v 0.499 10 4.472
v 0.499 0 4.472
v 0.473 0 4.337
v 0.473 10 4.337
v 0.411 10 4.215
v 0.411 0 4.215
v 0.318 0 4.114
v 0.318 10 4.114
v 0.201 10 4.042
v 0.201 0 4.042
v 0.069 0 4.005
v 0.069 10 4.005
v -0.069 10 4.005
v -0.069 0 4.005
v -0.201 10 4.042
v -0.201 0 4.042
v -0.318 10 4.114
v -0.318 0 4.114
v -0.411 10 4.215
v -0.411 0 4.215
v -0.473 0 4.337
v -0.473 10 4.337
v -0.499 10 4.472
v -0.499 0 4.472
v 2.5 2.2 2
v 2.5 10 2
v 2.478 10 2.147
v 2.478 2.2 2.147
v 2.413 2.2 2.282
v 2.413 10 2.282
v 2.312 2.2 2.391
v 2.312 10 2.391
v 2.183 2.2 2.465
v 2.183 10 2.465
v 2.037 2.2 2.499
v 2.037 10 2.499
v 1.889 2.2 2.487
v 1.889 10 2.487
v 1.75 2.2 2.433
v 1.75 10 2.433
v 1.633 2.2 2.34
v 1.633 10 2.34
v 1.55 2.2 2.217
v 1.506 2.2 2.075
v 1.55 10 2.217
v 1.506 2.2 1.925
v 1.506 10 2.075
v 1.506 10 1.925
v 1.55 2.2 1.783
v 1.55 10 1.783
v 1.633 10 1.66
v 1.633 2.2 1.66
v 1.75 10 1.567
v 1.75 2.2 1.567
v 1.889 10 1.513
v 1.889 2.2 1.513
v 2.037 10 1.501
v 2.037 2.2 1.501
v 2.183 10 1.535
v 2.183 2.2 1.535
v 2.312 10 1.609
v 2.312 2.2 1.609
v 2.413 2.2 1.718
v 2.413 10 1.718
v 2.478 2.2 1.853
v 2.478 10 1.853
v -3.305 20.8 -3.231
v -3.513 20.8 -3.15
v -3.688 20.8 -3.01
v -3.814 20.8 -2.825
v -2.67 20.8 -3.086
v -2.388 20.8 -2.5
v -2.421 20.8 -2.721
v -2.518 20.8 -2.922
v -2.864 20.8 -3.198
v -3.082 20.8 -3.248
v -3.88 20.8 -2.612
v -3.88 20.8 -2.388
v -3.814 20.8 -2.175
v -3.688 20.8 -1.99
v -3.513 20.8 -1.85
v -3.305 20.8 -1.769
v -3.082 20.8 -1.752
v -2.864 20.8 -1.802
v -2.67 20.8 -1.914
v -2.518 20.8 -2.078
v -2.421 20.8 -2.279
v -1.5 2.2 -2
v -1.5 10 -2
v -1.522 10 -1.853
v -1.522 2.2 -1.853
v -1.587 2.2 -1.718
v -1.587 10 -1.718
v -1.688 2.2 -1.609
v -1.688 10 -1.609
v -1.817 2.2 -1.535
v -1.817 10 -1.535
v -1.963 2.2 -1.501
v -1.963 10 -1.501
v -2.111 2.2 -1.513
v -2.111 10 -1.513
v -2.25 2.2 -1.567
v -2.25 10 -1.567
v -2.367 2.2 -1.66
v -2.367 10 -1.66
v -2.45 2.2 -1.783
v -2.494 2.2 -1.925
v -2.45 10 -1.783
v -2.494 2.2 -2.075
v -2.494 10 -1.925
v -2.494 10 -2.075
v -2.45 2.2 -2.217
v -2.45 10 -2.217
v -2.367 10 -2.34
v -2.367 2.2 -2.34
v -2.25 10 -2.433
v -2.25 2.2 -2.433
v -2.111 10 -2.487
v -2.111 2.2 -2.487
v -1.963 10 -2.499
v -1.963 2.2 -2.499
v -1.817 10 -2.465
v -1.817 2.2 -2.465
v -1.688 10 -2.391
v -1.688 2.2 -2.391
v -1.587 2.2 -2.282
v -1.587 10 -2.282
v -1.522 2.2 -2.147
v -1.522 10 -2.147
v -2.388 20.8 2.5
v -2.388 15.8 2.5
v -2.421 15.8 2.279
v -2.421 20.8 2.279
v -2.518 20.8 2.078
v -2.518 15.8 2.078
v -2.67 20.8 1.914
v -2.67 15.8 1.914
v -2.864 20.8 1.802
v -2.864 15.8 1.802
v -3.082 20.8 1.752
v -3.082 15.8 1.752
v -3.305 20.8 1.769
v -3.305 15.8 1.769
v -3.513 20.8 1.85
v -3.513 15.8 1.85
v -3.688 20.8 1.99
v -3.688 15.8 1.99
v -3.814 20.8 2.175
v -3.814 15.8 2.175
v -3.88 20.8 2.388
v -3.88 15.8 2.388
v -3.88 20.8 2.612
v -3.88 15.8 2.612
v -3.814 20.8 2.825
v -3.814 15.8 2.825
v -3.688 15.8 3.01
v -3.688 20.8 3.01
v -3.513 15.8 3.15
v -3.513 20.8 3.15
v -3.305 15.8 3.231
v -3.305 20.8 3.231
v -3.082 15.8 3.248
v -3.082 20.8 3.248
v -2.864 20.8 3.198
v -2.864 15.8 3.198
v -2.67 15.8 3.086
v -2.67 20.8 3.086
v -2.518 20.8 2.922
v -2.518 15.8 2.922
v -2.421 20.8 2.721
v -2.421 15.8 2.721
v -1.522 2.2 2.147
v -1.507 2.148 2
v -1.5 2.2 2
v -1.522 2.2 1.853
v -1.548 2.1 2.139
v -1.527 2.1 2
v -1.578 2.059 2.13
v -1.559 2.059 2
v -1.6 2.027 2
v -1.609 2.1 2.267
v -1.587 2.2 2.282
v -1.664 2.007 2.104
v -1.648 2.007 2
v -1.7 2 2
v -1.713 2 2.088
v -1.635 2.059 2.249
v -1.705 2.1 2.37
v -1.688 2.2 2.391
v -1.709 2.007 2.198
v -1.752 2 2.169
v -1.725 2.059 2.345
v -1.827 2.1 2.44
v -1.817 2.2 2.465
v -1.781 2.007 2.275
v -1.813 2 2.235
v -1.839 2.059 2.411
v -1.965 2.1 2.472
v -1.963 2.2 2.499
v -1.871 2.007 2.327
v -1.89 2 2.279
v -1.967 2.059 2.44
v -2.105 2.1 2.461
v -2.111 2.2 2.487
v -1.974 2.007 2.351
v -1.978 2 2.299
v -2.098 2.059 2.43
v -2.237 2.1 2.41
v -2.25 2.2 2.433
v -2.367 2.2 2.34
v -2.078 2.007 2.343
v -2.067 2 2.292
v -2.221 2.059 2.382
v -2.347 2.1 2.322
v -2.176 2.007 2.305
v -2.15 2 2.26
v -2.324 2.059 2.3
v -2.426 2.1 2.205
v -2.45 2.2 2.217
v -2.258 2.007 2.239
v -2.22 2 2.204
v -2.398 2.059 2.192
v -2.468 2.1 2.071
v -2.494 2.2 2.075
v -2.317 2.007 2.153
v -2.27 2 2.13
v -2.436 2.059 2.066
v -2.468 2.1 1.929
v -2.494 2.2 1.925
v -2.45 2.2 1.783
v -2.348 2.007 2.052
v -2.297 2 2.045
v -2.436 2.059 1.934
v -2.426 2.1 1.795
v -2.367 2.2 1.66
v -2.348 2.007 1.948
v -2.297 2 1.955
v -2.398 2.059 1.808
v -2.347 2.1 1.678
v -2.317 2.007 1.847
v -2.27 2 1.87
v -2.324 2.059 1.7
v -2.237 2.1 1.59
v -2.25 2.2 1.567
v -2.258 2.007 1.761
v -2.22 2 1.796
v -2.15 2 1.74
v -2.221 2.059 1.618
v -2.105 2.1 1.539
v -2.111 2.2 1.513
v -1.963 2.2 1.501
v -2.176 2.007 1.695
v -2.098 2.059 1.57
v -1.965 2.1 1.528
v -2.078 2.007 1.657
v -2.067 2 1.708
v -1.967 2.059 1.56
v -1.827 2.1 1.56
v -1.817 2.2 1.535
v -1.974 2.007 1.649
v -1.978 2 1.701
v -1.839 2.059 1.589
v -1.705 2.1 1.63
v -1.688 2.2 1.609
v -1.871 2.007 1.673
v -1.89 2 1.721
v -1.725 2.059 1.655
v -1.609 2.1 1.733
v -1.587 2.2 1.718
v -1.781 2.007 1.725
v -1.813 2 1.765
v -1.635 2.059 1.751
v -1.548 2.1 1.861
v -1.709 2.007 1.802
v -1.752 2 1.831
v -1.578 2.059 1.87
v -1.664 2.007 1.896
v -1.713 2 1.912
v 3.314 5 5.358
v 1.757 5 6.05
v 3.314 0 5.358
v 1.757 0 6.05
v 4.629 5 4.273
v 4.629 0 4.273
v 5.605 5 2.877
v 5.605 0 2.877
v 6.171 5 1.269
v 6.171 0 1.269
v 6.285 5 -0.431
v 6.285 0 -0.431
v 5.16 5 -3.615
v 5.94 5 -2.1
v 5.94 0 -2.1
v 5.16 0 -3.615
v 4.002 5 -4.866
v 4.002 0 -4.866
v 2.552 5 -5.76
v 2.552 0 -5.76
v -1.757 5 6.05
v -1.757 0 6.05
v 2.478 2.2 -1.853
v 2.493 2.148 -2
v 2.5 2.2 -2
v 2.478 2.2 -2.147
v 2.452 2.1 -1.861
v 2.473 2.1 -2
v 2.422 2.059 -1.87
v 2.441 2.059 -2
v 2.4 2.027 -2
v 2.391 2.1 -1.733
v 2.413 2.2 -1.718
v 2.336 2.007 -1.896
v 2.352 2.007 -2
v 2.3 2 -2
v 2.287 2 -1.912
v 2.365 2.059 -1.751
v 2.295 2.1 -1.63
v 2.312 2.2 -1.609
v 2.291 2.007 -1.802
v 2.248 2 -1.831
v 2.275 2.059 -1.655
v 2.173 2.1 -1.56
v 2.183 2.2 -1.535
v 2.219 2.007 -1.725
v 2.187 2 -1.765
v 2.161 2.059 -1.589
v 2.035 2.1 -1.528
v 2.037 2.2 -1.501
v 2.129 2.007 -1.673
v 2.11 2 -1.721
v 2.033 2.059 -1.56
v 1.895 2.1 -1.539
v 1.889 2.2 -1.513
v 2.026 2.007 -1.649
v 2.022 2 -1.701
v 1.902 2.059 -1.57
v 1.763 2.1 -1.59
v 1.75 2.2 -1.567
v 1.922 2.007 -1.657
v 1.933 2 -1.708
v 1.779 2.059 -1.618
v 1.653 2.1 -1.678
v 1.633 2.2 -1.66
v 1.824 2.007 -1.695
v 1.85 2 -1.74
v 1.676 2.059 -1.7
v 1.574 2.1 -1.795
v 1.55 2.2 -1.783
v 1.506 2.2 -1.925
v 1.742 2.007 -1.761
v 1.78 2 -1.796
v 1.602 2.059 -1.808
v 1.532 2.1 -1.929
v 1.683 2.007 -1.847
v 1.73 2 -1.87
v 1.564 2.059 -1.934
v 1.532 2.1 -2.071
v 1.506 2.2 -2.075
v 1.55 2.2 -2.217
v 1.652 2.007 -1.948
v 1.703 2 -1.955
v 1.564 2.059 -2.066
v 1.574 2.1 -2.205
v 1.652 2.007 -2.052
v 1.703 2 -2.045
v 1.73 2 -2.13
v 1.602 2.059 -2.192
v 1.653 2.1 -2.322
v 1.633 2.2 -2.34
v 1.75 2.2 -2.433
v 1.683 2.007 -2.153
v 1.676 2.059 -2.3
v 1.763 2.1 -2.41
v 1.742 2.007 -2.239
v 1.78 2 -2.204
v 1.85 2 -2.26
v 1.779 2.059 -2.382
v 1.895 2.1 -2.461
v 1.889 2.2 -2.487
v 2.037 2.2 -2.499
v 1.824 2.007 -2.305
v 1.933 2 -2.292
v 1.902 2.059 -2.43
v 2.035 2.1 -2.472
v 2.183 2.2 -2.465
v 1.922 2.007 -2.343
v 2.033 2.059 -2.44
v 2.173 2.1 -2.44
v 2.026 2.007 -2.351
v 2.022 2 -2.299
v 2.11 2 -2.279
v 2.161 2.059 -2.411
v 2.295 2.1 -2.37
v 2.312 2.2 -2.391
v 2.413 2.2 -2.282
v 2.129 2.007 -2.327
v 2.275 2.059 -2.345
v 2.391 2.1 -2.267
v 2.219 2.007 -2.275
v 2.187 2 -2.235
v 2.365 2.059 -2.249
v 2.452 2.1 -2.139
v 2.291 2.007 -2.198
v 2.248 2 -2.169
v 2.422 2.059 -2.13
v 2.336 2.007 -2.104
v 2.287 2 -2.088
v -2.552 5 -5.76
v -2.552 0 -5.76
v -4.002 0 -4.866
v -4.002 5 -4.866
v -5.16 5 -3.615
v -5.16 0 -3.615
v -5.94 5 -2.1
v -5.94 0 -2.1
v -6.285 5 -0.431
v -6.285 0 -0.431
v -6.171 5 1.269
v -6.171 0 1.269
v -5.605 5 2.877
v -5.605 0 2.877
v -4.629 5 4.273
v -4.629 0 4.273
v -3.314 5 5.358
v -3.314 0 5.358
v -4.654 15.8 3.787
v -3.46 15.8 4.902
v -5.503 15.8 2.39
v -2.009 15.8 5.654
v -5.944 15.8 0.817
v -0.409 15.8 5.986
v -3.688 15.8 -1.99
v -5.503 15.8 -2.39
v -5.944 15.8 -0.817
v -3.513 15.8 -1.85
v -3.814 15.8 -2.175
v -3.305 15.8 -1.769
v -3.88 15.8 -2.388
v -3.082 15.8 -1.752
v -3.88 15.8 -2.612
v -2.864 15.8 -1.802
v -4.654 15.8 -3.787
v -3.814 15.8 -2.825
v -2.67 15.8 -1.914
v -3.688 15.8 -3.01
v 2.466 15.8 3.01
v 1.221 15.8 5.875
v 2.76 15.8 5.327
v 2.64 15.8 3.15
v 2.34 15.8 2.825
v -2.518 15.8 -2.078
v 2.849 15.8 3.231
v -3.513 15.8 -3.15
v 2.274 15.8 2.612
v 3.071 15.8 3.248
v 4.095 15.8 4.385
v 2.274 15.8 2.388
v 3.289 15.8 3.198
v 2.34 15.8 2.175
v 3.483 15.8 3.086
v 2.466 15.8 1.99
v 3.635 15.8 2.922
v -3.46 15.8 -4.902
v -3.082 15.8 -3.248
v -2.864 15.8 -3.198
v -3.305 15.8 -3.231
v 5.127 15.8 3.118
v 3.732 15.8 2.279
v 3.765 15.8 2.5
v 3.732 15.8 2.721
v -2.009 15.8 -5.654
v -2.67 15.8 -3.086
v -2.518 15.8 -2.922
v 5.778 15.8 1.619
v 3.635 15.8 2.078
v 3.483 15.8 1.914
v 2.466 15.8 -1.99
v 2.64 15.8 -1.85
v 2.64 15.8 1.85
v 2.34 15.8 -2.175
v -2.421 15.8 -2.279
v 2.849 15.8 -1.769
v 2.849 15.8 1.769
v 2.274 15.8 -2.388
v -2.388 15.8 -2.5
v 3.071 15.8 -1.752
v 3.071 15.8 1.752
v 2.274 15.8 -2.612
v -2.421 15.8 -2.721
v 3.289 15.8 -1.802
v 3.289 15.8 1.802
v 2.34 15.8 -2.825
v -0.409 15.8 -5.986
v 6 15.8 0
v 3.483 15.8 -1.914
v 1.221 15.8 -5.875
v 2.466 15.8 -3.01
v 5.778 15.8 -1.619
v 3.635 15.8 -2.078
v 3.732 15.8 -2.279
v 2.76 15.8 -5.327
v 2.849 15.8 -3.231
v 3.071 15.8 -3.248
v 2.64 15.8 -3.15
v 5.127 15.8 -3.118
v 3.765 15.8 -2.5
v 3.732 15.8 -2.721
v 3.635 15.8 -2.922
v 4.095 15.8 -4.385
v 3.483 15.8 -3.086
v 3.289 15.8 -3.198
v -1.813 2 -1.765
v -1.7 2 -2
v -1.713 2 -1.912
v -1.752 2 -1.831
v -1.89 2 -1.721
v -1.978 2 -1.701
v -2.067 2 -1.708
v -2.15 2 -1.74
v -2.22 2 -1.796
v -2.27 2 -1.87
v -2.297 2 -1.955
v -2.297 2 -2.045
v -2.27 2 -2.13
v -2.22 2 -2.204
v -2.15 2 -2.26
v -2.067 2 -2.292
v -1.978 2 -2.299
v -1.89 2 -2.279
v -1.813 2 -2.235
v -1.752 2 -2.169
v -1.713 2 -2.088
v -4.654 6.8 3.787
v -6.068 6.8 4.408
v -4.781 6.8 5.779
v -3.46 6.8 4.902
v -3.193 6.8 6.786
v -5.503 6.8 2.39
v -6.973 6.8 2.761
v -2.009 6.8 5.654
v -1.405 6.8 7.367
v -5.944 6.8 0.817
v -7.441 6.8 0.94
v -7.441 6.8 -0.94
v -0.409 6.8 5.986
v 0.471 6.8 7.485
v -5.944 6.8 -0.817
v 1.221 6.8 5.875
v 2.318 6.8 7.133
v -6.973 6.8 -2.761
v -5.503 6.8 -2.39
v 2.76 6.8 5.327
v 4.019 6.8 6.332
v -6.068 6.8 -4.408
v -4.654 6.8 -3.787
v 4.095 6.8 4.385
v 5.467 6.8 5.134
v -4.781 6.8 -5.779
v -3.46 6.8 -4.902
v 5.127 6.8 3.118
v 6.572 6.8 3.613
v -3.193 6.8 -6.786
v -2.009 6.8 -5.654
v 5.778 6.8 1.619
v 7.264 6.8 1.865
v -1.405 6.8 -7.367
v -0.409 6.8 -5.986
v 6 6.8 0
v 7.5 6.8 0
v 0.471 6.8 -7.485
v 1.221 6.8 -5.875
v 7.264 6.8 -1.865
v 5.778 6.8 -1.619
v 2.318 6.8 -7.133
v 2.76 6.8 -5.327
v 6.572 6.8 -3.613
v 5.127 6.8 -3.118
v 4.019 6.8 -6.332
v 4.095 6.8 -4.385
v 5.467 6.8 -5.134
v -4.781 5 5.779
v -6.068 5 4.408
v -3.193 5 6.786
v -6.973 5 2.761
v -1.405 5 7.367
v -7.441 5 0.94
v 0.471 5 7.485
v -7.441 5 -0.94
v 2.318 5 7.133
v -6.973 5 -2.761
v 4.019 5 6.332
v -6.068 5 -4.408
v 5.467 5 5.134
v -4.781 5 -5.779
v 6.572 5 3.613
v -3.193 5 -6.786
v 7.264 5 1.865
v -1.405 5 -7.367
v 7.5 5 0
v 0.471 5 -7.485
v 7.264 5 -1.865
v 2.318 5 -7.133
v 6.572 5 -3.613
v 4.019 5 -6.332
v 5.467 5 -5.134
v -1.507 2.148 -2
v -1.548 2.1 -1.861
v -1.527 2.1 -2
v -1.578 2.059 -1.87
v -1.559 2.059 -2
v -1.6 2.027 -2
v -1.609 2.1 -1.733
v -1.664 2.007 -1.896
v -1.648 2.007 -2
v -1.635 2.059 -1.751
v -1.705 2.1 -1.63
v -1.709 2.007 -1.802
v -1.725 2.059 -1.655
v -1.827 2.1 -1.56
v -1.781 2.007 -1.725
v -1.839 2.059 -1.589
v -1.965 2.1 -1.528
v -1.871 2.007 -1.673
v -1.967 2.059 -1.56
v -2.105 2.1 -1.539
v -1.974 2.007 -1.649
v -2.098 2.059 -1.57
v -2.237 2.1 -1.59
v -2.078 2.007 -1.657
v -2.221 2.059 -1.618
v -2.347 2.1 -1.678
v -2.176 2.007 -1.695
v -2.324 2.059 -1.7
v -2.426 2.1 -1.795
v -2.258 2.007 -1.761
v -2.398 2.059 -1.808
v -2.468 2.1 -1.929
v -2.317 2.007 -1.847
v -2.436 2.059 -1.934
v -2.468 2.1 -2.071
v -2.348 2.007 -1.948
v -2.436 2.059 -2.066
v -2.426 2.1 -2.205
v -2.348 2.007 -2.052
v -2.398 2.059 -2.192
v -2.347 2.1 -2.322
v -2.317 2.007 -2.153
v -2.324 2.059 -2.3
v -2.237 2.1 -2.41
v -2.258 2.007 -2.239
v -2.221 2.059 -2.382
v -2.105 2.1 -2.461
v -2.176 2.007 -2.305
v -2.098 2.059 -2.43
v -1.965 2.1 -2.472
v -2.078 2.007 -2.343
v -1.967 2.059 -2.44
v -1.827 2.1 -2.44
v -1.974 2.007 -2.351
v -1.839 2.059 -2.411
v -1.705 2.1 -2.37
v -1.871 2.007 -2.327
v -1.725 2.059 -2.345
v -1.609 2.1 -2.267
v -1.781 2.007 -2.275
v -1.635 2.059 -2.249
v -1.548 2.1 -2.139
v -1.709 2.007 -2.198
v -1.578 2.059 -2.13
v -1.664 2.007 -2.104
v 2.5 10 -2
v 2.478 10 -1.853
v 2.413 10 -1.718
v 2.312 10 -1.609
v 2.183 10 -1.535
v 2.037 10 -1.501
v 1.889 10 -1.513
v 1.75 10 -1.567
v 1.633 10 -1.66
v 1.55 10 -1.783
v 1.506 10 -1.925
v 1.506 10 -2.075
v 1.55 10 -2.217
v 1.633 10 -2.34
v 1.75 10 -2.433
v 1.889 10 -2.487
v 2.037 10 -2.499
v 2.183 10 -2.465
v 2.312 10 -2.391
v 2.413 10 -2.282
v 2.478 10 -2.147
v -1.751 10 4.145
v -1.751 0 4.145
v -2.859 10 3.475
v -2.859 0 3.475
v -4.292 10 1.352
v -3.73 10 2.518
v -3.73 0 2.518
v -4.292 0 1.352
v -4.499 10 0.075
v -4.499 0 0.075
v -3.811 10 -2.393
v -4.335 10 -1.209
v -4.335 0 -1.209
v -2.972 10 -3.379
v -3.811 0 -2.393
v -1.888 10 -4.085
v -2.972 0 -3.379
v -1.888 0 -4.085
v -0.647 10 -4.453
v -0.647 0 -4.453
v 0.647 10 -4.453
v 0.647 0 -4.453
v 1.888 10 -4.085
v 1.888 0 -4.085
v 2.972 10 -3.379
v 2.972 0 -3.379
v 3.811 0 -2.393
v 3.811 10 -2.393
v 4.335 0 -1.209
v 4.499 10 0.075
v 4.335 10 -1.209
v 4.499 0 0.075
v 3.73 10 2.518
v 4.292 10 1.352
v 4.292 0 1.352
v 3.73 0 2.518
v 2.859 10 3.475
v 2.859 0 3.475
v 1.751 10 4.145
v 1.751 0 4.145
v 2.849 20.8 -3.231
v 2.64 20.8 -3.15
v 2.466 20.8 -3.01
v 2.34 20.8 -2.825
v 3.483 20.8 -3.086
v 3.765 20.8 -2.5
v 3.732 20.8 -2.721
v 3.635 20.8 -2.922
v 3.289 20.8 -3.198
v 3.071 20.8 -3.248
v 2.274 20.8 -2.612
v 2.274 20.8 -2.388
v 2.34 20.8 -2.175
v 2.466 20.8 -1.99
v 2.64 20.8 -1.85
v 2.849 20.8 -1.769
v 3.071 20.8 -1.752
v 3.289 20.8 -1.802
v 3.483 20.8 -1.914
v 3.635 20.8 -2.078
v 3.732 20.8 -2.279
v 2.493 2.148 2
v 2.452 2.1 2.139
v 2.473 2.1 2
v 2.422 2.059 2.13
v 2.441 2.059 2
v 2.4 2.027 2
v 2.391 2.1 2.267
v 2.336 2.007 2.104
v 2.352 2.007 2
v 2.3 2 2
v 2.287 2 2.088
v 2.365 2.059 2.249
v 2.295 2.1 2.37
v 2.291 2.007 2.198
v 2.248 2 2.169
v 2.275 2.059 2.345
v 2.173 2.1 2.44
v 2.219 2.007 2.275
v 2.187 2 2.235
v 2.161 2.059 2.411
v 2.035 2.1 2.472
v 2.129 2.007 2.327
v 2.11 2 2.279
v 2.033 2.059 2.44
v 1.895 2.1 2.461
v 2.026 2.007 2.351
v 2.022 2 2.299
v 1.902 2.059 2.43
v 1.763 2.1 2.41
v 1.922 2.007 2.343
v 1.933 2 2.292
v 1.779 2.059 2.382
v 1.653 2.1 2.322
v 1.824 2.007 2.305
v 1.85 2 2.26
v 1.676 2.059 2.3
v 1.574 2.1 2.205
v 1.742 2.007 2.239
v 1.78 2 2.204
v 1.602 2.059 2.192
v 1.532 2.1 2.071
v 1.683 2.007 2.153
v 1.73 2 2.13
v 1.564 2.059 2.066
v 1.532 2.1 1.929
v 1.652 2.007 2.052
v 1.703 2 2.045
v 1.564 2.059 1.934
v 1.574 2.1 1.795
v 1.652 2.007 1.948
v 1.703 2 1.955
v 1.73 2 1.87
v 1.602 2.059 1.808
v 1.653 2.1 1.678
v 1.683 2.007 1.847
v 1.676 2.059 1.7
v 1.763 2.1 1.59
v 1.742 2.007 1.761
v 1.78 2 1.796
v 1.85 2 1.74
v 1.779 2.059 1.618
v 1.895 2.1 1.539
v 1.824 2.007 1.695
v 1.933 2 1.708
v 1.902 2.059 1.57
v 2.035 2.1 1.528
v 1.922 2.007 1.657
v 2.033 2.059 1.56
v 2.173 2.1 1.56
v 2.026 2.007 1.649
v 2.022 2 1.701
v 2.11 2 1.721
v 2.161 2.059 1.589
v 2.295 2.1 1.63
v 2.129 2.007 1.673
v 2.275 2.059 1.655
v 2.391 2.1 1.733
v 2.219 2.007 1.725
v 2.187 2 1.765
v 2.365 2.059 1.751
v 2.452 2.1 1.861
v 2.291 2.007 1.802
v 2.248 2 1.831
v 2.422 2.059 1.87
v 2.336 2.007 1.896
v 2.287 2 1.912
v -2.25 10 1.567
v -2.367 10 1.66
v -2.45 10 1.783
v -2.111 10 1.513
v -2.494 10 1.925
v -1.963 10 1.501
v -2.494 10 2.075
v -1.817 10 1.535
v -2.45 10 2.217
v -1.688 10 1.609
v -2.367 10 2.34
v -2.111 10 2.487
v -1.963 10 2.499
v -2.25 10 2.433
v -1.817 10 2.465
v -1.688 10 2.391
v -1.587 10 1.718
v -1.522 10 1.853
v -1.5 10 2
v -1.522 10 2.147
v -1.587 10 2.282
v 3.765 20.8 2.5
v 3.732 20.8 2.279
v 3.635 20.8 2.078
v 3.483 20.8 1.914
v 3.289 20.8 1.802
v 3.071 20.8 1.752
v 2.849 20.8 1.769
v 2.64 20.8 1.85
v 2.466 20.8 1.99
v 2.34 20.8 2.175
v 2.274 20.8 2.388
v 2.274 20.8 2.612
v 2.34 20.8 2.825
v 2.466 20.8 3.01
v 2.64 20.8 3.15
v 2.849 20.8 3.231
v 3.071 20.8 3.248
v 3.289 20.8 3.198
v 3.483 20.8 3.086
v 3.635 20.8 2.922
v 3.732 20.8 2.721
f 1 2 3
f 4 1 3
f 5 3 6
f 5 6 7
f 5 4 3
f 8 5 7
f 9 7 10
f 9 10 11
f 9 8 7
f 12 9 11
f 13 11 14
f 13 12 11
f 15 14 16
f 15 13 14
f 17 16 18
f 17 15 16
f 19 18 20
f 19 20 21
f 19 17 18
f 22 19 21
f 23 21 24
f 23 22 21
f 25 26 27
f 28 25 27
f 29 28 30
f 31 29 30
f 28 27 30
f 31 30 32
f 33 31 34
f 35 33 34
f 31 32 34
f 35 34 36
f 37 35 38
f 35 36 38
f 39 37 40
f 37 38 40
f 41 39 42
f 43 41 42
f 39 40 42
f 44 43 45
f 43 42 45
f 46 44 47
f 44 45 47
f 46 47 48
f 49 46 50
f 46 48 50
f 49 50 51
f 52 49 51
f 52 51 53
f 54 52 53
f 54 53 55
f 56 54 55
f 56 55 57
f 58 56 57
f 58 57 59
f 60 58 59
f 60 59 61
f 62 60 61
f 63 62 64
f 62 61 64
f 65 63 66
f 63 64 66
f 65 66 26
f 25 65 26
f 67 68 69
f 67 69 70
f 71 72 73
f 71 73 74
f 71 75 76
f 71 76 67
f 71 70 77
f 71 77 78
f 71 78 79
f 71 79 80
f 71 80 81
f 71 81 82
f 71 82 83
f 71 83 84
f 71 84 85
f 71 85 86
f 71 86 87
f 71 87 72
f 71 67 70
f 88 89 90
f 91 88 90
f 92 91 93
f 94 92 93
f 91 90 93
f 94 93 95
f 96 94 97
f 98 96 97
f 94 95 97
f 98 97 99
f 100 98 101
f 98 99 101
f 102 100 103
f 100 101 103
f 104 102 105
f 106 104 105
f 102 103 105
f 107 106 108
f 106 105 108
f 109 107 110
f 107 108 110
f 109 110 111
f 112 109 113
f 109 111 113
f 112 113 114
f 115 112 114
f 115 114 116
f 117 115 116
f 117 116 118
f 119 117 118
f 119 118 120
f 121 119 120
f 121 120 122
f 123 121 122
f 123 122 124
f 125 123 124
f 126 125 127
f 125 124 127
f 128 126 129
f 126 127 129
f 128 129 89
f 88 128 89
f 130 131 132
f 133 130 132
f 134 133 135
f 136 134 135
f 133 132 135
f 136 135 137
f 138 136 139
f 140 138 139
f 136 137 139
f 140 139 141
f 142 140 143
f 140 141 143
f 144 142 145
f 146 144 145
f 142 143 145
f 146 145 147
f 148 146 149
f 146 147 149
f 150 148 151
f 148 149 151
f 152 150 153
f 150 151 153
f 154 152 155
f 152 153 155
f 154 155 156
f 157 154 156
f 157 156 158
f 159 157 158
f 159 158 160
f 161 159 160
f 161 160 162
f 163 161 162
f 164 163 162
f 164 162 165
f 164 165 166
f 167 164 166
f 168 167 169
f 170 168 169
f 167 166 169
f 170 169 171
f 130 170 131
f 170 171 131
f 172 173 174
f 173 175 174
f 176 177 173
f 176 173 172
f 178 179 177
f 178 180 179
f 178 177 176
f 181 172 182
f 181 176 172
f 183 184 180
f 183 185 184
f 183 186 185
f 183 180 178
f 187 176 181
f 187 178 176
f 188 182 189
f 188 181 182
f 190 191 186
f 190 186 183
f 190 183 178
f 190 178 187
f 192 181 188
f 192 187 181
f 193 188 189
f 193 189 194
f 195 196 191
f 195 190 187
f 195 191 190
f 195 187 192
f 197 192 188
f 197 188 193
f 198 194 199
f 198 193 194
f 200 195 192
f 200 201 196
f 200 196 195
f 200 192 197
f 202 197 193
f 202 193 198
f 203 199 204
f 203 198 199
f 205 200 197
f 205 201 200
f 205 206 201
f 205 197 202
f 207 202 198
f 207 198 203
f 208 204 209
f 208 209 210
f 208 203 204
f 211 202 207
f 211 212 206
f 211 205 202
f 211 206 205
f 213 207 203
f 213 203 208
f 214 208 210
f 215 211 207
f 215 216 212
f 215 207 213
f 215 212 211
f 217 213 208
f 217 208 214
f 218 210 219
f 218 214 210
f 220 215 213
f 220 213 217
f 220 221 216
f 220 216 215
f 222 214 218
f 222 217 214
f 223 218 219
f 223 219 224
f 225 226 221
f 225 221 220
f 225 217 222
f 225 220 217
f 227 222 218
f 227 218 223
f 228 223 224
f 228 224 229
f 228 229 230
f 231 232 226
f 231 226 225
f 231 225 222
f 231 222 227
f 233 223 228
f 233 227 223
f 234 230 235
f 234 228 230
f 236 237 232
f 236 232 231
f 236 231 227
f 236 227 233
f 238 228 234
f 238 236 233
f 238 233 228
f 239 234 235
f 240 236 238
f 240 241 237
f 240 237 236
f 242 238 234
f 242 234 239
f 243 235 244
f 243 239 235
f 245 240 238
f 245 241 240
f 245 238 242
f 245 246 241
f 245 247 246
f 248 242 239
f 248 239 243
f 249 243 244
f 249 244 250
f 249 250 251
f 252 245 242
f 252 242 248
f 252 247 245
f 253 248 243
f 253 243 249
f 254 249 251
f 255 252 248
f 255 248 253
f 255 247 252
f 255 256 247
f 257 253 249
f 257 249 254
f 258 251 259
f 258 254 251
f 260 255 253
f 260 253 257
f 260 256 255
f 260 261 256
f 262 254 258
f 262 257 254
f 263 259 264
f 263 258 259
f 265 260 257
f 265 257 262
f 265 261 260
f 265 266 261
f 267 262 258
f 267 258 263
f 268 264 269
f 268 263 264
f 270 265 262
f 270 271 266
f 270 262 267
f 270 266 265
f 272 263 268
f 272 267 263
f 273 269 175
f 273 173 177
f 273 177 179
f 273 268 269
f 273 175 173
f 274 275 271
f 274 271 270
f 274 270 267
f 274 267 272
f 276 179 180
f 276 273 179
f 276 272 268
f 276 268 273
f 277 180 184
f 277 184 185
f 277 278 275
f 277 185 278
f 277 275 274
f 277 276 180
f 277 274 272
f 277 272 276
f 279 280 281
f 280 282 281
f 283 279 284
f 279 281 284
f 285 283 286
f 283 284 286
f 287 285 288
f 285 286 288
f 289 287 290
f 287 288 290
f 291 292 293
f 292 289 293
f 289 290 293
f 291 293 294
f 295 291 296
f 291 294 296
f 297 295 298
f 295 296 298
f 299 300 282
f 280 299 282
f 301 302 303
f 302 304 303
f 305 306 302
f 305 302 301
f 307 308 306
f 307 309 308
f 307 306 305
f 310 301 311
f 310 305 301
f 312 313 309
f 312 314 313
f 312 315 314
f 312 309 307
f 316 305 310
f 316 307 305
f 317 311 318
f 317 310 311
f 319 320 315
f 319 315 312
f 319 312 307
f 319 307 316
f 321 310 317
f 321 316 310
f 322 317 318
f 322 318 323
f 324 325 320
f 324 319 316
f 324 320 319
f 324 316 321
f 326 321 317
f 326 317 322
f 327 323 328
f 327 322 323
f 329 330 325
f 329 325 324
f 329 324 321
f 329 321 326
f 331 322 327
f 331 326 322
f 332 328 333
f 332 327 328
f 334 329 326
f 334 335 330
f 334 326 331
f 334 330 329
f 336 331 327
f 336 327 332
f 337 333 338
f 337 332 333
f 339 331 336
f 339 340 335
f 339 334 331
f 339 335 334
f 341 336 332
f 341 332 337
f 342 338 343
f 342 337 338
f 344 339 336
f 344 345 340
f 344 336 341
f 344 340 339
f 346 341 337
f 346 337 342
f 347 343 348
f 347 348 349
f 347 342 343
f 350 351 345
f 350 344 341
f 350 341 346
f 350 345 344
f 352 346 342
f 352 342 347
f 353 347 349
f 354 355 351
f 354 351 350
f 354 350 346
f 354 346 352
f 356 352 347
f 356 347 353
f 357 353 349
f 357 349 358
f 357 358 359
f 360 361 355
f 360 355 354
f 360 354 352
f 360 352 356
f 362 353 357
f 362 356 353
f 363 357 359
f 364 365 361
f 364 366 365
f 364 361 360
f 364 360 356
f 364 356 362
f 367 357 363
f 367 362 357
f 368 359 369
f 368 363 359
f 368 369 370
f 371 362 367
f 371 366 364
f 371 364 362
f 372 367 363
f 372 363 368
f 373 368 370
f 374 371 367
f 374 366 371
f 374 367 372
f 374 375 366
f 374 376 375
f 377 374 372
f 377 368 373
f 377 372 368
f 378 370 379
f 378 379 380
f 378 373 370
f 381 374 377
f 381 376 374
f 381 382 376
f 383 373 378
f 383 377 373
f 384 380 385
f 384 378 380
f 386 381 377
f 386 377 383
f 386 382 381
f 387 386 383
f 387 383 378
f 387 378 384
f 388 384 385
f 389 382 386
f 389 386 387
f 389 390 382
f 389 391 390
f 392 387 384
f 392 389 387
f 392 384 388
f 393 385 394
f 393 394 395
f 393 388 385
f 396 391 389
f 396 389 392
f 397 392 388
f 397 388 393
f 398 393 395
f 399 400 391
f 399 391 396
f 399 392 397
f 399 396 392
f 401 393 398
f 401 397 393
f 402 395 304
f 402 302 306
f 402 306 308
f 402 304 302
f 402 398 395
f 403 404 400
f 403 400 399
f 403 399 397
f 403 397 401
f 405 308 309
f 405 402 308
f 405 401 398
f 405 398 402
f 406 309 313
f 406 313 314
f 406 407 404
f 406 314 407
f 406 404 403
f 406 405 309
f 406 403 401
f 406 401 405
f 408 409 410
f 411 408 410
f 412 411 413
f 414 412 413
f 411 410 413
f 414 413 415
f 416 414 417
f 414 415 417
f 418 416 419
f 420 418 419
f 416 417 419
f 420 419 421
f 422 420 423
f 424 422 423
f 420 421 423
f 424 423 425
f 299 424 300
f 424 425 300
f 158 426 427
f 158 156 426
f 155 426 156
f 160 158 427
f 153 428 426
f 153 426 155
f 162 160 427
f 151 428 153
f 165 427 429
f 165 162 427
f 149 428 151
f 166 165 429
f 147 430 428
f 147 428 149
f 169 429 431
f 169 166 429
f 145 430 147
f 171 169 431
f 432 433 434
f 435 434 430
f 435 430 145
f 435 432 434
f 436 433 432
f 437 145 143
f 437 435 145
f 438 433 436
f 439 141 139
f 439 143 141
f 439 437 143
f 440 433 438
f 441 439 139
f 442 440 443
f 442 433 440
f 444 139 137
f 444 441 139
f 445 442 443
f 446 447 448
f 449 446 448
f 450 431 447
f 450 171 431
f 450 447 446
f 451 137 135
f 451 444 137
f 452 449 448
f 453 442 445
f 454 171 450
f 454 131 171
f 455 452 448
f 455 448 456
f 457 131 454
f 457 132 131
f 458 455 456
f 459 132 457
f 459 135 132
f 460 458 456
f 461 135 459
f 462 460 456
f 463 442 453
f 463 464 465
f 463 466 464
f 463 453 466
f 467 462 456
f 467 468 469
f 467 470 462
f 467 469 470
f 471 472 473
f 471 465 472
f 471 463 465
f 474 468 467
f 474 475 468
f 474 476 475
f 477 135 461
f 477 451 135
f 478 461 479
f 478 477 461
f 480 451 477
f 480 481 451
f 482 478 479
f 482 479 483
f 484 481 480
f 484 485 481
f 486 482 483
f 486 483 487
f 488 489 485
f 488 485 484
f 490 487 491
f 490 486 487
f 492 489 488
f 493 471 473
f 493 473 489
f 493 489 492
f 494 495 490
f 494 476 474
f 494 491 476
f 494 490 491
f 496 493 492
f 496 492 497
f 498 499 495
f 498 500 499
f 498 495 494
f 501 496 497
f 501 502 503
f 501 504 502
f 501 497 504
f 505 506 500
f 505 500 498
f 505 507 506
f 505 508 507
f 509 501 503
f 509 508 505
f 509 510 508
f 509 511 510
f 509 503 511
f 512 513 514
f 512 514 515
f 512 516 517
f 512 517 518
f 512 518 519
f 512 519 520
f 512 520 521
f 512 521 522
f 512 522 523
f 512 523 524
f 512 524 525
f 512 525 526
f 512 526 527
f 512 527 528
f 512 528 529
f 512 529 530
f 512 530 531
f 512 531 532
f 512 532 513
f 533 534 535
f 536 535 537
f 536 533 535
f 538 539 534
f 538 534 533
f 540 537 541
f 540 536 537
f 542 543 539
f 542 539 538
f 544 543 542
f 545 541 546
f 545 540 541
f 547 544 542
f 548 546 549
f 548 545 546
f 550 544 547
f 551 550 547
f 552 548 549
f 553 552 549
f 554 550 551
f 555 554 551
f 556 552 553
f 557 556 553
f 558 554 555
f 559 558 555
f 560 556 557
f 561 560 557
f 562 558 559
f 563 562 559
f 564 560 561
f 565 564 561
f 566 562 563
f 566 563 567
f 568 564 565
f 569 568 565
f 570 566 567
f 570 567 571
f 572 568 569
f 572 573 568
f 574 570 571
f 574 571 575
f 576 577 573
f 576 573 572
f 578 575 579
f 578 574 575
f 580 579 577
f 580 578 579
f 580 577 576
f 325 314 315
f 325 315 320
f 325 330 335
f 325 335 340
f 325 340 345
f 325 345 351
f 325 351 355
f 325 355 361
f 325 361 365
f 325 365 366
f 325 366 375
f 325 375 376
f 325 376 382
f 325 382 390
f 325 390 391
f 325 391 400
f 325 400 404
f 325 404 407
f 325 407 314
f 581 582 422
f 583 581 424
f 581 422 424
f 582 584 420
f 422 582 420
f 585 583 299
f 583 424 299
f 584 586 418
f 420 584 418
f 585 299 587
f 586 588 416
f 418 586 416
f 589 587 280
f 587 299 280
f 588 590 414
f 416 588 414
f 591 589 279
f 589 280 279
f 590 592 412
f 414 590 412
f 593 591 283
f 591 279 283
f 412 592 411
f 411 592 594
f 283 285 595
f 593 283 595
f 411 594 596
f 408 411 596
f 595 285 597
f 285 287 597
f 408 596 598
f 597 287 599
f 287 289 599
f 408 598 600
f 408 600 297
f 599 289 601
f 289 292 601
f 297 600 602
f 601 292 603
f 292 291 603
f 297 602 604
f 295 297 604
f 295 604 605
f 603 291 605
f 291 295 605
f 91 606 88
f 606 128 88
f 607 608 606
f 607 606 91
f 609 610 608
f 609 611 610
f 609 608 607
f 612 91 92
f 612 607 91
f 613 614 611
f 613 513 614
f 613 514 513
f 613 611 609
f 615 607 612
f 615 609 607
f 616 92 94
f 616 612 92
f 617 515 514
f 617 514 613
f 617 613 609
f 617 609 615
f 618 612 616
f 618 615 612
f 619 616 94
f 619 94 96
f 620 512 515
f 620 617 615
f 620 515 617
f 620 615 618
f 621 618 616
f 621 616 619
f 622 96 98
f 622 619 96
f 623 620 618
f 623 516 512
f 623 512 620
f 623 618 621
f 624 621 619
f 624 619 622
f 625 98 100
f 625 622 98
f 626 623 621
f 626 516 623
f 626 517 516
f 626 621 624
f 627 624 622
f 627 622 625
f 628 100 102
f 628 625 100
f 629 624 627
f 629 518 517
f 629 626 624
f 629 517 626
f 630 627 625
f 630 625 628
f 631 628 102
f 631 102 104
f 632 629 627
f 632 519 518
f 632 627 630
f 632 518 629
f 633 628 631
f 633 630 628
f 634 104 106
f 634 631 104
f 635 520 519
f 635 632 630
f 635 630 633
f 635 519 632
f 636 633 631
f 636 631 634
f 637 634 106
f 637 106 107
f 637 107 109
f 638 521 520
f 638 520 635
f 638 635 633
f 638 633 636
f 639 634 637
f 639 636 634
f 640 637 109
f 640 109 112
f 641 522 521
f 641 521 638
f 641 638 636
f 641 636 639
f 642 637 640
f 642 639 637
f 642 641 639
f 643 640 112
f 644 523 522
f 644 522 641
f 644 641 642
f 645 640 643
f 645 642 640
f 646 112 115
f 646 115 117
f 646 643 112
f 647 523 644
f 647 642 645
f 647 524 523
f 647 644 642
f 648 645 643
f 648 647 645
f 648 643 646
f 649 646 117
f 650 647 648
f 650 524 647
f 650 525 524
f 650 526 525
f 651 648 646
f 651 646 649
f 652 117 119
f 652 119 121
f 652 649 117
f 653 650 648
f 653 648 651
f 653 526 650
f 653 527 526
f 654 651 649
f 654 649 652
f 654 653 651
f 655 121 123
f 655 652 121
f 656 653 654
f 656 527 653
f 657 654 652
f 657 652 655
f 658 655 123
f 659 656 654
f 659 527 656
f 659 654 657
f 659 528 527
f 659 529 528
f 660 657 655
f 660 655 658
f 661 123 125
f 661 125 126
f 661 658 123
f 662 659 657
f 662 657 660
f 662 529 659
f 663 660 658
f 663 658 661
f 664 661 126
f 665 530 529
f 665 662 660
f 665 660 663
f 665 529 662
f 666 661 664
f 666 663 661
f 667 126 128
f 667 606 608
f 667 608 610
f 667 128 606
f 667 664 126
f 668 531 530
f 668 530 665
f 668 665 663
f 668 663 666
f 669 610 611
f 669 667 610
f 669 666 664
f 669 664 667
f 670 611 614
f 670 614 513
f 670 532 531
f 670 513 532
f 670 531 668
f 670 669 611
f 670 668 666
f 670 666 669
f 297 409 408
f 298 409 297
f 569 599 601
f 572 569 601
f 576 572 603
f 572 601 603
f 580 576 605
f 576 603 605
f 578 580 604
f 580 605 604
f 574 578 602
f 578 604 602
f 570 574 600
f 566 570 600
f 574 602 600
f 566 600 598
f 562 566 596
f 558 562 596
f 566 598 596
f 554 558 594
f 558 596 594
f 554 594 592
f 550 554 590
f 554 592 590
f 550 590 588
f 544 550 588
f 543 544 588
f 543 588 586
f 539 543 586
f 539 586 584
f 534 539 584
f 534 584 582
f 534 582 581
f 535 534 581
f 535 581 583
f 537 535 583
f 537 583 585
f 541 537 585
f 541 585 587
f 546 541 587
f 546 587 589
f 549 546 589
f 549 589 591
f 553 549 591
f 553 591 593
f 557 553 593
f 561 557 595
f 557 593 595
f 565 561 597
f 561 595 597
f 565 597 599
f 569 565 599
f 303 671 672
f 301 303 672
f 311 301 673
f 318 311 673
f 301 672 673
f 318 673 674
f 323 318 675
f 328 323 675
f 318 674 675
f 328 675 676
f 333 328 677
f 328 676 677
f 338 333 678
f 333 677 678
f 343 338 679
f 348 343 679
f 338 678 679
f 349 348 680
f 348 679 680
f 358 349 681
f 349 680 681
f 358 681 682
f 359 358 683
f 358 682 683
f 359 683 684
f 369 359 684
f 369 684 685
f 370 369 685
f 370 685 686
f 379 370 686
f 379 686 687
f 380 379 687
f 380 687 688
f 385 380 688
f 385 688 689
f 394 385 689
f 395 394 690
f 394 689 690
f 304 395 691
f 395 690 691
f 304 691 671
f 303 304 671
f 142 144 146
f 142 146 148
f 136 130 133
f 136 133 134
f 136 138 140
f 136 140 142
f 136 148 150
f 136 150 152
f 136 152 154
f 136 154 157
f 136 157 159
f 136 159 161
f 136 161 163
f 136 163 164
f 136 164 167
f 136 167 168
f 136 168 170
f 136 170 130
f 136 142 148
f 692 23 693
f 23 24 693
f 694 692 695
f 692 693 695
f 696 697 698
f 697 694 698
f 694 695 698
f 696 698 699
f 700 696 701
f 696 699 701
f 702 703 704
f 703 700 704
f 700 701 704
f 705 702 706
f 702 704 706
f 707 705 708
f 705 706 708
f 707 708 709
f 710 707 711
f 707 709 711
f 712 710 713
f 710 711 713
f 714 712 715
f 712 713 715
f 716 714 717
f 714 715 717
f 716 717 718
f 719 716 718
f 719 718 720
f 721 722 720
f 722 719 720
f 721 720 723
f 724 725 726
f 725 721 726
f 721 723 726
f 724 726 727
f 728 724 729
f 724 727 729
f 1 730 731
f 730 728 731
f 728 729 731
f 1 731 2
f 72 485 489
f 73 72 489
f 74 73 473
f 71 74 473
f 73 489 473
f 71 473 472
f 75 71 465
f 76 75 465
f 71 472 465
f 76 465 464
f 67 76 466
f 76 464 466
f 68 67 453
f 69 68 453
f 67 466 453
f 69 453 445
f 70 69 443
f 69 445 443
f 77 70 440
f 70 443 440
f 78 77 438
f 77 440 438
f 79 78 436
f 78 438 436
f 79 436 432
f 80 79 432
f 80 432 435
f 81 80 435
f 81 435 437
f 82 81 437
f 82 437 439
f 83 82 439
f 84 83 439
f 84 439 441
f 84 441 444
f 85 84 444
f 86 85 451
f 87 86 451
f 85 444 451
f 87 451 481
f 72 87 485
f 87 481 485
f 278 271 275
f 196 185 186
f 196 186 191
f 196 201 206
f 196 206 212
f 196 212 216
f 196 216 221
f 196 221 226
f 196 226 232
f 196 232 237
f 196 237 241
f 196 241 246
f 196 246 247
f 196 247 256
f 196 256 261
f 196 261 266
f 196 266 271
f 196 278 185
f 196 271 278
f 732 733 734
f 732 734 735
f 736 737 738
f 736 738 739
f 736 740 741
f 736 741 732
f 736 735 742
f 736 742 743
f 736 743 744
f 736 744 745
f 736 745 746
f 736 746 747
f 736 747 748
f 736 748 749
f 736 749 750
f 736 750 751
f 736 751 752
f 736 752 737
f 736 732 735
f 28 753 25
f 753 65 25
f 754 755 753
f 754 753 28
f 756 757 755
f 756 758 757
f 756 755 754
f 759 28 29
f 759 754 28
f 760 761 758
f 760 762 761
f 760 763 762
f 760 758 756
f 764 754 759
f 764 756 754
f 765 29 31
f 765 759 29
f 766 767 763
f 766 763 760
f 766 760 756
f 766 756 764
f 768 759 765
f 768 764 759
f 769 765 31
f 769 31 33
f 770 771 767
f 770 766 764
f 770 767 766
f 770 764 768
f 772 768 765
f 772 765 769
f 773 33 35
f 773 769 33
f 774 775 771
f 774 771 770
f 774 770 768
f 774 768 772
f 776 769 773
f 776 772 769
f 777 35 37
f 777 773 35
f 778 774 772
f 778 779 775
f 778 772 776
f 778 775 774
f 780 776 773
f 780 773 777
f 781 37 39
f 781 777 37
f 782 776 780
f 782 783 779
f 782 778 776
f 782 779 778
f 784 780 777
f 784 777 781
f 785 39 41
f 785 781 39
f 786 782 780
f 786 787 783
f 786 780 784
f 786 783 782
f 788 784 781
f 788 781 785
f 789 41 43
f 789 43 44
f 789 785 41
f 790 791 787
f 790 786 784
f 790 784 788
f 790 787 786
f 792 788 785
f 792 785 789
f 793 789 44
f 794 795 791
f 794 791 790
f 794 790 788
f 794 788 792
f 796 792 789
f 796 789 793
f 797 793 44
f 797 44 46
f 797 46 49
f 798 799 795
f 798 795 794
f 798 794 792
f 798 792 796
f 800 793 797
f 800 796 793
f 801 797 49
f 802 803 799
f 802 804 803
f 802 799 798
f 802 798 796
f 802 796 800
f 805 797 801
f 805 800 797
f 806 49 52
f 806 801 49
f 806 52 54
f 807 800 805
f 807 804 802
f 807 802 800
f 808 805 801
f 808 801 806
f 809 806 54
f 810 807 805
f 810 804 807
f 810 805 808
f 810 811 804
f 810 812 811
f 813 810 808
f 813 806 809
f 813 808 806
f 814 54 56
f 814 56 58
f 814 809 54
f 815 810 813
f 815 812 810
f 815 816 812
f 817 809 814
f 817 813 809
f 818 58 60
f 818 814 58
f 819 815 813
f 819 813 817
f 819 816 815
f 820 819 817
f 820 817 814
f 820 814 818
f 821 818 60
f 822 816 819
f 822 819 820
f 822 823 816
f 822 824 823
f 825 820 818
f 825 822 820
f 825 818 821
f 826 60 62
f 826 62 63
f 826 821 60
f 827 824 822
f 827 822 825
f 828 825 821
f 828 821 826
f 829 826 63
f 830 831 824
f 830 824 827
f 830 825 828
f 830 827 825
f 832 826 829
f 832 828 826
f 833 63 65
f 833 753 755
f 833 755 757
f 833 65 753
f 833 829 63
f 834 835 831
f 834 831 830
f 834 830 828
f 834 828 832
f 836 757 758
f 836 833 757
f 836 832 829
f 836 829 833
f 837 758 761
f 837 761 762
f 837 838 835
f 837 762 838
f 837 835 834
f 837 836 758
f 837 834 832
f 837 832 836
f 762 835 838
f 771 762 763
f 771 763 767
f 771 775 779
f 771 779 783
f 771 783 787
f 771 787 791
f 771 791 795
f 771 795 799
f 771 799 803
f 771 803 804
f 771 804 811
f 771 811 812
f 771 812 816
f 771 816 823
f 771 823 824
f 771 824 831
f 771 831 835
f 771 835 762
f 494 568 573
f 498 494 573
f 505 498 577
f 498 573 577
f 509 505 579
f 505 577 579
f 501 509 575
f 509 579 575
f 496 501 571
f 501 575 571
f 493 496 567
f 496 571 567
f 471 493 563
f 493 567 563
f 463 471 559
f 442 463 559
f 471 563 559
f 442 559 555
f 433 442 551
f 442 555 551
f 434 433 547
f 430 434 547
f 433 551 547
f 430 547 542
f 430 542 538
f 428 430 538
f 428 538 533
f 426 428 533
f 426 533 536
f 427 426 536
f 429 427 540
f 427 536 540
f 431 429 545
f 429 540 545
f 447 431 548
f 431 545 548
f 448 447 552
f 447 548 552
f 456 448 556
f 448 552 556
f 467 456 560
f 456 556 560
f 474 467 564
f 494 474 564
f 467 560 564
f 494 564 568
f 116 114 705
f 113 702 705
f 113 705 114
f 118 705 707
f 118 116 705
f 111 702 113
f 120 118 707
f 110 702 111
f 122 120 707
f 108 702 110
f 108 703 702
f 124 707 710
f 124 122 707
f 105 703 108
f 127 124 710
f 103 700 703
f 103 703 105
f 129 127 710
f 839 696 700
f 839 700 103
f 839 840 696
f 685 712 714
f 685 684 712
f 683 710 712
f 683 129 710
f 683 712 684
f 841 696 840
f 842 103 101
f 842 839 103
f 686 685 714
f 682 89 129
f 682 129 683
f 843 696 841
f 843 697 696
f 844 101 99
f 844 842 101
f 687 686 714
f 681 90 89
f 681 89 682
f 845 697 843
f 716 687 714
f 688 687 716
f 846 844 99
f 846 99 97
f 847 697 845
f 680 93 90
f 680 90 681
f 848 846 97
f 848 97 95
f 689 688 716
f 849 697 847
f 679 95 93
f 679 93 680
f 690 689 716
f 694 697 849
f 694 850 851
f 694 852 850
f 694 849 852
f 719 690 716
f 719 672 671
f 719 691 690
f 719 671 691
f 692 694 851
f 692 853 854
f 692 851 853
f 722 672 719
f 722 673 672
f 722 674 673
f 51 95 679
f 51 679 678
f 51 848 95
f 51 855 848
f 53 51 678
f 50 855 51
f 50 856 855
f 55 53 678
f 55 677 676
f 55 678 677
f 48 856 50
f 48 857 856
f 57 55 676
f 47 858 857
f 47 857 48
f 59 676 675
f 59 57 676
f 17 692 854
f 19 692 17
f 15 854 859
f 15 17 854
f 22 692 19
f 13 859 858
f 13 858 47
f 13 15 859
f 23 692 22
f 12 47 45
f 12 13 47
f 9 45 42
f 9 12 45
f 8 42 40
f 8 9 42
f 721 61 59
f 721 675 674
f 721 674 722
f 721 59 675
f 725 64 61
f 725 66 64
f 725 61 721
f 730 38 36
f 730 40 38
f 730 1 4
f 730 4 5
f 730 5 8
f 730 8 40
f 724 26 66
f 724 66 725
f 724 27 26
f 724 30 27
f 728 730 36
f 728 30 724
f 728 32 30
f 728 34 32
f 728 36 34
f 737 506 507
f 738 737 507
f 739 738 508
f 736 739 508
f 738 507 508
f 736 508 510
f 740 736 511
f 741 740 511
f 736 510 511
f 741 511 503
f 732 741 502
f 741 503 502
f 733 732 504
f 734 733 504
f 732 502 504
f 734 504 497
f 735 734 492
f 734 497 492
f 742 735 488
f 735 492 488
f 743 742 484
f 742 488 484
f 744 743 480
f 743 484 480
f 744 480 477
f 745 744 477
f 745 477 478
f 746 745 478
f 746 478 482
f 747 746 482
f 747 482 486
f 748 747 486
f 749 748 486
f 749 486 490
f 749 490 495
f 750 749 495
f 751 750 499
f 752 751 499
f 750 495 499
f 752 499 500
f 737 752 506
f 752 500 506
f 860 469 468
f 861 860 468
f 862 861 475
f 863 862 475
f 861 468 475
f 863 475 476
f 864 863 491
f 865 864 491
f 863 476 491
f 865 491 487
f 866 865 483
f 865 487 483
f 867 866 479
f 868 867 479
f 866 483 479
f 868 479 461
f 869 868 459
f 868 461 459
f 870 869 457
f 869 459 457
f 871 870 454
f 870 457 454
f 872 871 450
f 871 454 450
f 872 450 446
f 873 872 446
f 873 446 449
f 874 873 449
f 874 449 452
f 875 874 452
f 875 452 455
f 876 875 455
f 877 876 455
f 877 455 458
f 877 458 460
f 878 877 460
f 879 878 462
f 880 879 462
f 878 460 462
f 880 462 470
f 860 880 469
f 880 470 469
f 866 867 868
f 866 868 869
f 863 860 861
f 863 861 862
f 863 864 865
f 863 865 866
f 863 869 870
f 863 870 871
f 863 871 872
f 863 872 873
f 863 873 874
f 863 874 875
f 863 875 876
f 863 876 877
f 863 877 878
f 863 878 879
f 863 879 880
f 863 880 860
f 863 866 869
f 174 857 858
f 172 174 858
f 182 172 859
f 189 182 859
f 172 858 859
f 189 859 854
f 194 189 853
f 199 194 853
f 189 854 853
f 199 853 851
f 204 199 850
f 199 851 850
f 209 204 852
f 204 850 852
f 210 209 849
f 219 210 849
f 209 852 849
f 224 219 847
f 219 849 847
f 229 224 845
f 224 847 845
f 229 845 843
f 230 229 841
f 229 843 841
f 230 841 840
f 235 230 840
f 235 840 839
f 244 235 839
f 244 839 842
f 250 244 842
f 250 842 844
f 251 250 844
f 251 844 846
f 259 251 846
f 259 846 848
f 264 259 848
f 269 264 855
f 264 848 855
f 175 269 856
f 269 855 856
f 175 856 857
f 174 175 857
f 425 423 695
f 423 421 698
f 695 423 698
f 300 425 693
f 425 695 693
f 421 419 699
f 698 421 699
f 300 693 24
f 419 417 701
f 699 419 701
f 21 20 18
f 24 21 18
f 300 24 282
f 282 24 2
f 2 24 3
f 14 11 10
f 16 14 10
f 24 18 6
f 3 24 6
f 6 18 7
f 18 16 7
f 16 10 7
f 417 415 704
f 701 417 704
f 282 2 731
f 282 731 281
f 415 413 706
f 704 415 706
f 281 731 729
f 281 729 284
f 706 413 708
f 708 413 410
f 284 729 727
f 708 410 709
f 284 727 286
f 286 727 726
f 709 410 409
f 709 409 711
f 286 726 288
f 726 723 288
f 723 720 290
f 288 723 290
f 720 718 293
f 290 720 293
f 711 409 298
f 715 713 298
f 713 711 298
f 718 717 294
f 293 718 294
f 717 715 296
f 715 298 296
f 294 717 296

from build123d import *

# Parameters (mm, degrees)
SKETCH1_R           = 6.3
BOSS_EXTRUDE1_DEPTH = 5
SKETCH2_R           = 7.5
BOSS_EXTRUDE2_DEPTH = 1.8
SKETCH3_R           = 6
BOSS_EXTRUDE3_DEPTH = 9
SKETCH4_R           = 4.5
CUT_EXTRUDE1_DEPTH  = 10
BOSS_EXTRUDE4_DEPTH = 10
SKETCH6_R           = 0.5
BOSS_EXTRUDE5_DEPTH = 8
FILLET1_R           = 0.2
SKETCH7_R           = 0.75
BOSS_EXTRUDE6_DEPTH = 5
SKETCH8_W           = 10
SKETCH8_H           = 0.5
SKETCH8_H_2         = 1.079785018
CUT_EXTRUDE2_DEPTH  = 5


with BuildPart() as part:
    # Sketch1 → Boss-Extrude1 (new body)
    with BuildSketch(Plane(origin=(0, 0, 0), x_dir=(1, 0, 0), z_dir=(0, 1, 0))):
        Circle(SKETCH1_R)
    extrude(amount=BOSS_EXTRUDE1_DEPTH)

    # Sketch2 → Boss-Extrude2 (add)
    with BuildSketch(Plane(origin=(0, 5, 0), x_dir=(1, 0, 0), z_dir=(0, 1, 0))):
        Circle(SKETCH2_R)
    extrude(amount=BOSS_EXTRUDE2_DEPTH)

    # Sketch3 → Boss-Extrude3 (add)
    with BuildSketch(Plane(origin=(0, 6.8, 0), x_dir=(1, 0, 0), z_dir=(0, 1, 0))):
        Circle(SKETCH3_R)
    extrude(amount=BOSS_EXTRUDE3_DEPTH)

    # Sketch4 → Cut-Extrude1 (cut)
    with BuildSketch(Plane.XZ):
        Circle(SKETCH4_R)
    extrude(amount=-CUT_EXTRUDE1_DEPTH, mode=Mode.SUBTRACT)

    # Sketch5 → Boss-Extrude4 (add)
    with BuildSketch(Plane.XZ.offset(-10)):
        with BuildLine():
            Line((-0.5, 4.5), (0.5, 4.5))
            ThreePointArc((0.5, 4.5), (0, 4), (-0.5, 4.5))
        make_face()
    extrude(amount=BOSS_EXTRUDE4_DEPTH)

    # Sketch6 → Boss-Extrude5 (add)
    with BuildSketch(Plane.XZ.offset(-10)):
        with Locations((-2, 2)):
            Circle(SKETCH6_R)
        with Locations((2, 2)):
            Circle(SKETCH6_R)
        with Locations((2, -2)):
            Circle(SKETCH6_R)
        with Locations((-2, -2)):
            Circle(SKETCH6_R)
    extrude(amount=BOSS_EXTRUDE5_DEPTH)

    # Fillet1
    fillet1_edges = [part.edges().sort_by_distance(p)[0] for p in [
        (-2.5, 2, 2),
        (1.5, 2, 2),
        (1.5, 2, -2),
        (-2.5, 2, -2),
    ]]
    fillet(fillet1_edges, radius=FILLET1_R)

    # Sketch7 → Boss-Extrude6 (add)
    with BuildSketch(Plane(origin=(0, 15.8, 0), x_dir=(1, 0, 0), z_dir=(0, 1, 0))):
        with Locations((-3.138015201, 2.5)):
            Circle(SKETCH7_R)
        with Locations((-3.138015201, -2.5)):
            Circle(SKETCH7_R)
        with Locations((3.015436482, -2.5)):
            Circle(SKETCH7_R)
        with Locations((3.015436482, 2.5)):
            Circle(SKETCH7_R)
    extrude(amount=BOSS_EXTRUDE6_DEPTH)

    # Sketch8 → Cut-Extrude2 (cut)
    with BuildSketch(Plane.XZ):
        with Locations((0, 6.3)):
            Rectangle(SKETCH8_W, SKETCH8_H)
        with Locations((0, -6.3)):
            Rectangle(SKETCH8_W, SKETCH8_H_2)
    extrude(amount=-CUT_EXTRUDE2_DEPTH, mode=Mode.SUBTRACT)


solid = part.part
